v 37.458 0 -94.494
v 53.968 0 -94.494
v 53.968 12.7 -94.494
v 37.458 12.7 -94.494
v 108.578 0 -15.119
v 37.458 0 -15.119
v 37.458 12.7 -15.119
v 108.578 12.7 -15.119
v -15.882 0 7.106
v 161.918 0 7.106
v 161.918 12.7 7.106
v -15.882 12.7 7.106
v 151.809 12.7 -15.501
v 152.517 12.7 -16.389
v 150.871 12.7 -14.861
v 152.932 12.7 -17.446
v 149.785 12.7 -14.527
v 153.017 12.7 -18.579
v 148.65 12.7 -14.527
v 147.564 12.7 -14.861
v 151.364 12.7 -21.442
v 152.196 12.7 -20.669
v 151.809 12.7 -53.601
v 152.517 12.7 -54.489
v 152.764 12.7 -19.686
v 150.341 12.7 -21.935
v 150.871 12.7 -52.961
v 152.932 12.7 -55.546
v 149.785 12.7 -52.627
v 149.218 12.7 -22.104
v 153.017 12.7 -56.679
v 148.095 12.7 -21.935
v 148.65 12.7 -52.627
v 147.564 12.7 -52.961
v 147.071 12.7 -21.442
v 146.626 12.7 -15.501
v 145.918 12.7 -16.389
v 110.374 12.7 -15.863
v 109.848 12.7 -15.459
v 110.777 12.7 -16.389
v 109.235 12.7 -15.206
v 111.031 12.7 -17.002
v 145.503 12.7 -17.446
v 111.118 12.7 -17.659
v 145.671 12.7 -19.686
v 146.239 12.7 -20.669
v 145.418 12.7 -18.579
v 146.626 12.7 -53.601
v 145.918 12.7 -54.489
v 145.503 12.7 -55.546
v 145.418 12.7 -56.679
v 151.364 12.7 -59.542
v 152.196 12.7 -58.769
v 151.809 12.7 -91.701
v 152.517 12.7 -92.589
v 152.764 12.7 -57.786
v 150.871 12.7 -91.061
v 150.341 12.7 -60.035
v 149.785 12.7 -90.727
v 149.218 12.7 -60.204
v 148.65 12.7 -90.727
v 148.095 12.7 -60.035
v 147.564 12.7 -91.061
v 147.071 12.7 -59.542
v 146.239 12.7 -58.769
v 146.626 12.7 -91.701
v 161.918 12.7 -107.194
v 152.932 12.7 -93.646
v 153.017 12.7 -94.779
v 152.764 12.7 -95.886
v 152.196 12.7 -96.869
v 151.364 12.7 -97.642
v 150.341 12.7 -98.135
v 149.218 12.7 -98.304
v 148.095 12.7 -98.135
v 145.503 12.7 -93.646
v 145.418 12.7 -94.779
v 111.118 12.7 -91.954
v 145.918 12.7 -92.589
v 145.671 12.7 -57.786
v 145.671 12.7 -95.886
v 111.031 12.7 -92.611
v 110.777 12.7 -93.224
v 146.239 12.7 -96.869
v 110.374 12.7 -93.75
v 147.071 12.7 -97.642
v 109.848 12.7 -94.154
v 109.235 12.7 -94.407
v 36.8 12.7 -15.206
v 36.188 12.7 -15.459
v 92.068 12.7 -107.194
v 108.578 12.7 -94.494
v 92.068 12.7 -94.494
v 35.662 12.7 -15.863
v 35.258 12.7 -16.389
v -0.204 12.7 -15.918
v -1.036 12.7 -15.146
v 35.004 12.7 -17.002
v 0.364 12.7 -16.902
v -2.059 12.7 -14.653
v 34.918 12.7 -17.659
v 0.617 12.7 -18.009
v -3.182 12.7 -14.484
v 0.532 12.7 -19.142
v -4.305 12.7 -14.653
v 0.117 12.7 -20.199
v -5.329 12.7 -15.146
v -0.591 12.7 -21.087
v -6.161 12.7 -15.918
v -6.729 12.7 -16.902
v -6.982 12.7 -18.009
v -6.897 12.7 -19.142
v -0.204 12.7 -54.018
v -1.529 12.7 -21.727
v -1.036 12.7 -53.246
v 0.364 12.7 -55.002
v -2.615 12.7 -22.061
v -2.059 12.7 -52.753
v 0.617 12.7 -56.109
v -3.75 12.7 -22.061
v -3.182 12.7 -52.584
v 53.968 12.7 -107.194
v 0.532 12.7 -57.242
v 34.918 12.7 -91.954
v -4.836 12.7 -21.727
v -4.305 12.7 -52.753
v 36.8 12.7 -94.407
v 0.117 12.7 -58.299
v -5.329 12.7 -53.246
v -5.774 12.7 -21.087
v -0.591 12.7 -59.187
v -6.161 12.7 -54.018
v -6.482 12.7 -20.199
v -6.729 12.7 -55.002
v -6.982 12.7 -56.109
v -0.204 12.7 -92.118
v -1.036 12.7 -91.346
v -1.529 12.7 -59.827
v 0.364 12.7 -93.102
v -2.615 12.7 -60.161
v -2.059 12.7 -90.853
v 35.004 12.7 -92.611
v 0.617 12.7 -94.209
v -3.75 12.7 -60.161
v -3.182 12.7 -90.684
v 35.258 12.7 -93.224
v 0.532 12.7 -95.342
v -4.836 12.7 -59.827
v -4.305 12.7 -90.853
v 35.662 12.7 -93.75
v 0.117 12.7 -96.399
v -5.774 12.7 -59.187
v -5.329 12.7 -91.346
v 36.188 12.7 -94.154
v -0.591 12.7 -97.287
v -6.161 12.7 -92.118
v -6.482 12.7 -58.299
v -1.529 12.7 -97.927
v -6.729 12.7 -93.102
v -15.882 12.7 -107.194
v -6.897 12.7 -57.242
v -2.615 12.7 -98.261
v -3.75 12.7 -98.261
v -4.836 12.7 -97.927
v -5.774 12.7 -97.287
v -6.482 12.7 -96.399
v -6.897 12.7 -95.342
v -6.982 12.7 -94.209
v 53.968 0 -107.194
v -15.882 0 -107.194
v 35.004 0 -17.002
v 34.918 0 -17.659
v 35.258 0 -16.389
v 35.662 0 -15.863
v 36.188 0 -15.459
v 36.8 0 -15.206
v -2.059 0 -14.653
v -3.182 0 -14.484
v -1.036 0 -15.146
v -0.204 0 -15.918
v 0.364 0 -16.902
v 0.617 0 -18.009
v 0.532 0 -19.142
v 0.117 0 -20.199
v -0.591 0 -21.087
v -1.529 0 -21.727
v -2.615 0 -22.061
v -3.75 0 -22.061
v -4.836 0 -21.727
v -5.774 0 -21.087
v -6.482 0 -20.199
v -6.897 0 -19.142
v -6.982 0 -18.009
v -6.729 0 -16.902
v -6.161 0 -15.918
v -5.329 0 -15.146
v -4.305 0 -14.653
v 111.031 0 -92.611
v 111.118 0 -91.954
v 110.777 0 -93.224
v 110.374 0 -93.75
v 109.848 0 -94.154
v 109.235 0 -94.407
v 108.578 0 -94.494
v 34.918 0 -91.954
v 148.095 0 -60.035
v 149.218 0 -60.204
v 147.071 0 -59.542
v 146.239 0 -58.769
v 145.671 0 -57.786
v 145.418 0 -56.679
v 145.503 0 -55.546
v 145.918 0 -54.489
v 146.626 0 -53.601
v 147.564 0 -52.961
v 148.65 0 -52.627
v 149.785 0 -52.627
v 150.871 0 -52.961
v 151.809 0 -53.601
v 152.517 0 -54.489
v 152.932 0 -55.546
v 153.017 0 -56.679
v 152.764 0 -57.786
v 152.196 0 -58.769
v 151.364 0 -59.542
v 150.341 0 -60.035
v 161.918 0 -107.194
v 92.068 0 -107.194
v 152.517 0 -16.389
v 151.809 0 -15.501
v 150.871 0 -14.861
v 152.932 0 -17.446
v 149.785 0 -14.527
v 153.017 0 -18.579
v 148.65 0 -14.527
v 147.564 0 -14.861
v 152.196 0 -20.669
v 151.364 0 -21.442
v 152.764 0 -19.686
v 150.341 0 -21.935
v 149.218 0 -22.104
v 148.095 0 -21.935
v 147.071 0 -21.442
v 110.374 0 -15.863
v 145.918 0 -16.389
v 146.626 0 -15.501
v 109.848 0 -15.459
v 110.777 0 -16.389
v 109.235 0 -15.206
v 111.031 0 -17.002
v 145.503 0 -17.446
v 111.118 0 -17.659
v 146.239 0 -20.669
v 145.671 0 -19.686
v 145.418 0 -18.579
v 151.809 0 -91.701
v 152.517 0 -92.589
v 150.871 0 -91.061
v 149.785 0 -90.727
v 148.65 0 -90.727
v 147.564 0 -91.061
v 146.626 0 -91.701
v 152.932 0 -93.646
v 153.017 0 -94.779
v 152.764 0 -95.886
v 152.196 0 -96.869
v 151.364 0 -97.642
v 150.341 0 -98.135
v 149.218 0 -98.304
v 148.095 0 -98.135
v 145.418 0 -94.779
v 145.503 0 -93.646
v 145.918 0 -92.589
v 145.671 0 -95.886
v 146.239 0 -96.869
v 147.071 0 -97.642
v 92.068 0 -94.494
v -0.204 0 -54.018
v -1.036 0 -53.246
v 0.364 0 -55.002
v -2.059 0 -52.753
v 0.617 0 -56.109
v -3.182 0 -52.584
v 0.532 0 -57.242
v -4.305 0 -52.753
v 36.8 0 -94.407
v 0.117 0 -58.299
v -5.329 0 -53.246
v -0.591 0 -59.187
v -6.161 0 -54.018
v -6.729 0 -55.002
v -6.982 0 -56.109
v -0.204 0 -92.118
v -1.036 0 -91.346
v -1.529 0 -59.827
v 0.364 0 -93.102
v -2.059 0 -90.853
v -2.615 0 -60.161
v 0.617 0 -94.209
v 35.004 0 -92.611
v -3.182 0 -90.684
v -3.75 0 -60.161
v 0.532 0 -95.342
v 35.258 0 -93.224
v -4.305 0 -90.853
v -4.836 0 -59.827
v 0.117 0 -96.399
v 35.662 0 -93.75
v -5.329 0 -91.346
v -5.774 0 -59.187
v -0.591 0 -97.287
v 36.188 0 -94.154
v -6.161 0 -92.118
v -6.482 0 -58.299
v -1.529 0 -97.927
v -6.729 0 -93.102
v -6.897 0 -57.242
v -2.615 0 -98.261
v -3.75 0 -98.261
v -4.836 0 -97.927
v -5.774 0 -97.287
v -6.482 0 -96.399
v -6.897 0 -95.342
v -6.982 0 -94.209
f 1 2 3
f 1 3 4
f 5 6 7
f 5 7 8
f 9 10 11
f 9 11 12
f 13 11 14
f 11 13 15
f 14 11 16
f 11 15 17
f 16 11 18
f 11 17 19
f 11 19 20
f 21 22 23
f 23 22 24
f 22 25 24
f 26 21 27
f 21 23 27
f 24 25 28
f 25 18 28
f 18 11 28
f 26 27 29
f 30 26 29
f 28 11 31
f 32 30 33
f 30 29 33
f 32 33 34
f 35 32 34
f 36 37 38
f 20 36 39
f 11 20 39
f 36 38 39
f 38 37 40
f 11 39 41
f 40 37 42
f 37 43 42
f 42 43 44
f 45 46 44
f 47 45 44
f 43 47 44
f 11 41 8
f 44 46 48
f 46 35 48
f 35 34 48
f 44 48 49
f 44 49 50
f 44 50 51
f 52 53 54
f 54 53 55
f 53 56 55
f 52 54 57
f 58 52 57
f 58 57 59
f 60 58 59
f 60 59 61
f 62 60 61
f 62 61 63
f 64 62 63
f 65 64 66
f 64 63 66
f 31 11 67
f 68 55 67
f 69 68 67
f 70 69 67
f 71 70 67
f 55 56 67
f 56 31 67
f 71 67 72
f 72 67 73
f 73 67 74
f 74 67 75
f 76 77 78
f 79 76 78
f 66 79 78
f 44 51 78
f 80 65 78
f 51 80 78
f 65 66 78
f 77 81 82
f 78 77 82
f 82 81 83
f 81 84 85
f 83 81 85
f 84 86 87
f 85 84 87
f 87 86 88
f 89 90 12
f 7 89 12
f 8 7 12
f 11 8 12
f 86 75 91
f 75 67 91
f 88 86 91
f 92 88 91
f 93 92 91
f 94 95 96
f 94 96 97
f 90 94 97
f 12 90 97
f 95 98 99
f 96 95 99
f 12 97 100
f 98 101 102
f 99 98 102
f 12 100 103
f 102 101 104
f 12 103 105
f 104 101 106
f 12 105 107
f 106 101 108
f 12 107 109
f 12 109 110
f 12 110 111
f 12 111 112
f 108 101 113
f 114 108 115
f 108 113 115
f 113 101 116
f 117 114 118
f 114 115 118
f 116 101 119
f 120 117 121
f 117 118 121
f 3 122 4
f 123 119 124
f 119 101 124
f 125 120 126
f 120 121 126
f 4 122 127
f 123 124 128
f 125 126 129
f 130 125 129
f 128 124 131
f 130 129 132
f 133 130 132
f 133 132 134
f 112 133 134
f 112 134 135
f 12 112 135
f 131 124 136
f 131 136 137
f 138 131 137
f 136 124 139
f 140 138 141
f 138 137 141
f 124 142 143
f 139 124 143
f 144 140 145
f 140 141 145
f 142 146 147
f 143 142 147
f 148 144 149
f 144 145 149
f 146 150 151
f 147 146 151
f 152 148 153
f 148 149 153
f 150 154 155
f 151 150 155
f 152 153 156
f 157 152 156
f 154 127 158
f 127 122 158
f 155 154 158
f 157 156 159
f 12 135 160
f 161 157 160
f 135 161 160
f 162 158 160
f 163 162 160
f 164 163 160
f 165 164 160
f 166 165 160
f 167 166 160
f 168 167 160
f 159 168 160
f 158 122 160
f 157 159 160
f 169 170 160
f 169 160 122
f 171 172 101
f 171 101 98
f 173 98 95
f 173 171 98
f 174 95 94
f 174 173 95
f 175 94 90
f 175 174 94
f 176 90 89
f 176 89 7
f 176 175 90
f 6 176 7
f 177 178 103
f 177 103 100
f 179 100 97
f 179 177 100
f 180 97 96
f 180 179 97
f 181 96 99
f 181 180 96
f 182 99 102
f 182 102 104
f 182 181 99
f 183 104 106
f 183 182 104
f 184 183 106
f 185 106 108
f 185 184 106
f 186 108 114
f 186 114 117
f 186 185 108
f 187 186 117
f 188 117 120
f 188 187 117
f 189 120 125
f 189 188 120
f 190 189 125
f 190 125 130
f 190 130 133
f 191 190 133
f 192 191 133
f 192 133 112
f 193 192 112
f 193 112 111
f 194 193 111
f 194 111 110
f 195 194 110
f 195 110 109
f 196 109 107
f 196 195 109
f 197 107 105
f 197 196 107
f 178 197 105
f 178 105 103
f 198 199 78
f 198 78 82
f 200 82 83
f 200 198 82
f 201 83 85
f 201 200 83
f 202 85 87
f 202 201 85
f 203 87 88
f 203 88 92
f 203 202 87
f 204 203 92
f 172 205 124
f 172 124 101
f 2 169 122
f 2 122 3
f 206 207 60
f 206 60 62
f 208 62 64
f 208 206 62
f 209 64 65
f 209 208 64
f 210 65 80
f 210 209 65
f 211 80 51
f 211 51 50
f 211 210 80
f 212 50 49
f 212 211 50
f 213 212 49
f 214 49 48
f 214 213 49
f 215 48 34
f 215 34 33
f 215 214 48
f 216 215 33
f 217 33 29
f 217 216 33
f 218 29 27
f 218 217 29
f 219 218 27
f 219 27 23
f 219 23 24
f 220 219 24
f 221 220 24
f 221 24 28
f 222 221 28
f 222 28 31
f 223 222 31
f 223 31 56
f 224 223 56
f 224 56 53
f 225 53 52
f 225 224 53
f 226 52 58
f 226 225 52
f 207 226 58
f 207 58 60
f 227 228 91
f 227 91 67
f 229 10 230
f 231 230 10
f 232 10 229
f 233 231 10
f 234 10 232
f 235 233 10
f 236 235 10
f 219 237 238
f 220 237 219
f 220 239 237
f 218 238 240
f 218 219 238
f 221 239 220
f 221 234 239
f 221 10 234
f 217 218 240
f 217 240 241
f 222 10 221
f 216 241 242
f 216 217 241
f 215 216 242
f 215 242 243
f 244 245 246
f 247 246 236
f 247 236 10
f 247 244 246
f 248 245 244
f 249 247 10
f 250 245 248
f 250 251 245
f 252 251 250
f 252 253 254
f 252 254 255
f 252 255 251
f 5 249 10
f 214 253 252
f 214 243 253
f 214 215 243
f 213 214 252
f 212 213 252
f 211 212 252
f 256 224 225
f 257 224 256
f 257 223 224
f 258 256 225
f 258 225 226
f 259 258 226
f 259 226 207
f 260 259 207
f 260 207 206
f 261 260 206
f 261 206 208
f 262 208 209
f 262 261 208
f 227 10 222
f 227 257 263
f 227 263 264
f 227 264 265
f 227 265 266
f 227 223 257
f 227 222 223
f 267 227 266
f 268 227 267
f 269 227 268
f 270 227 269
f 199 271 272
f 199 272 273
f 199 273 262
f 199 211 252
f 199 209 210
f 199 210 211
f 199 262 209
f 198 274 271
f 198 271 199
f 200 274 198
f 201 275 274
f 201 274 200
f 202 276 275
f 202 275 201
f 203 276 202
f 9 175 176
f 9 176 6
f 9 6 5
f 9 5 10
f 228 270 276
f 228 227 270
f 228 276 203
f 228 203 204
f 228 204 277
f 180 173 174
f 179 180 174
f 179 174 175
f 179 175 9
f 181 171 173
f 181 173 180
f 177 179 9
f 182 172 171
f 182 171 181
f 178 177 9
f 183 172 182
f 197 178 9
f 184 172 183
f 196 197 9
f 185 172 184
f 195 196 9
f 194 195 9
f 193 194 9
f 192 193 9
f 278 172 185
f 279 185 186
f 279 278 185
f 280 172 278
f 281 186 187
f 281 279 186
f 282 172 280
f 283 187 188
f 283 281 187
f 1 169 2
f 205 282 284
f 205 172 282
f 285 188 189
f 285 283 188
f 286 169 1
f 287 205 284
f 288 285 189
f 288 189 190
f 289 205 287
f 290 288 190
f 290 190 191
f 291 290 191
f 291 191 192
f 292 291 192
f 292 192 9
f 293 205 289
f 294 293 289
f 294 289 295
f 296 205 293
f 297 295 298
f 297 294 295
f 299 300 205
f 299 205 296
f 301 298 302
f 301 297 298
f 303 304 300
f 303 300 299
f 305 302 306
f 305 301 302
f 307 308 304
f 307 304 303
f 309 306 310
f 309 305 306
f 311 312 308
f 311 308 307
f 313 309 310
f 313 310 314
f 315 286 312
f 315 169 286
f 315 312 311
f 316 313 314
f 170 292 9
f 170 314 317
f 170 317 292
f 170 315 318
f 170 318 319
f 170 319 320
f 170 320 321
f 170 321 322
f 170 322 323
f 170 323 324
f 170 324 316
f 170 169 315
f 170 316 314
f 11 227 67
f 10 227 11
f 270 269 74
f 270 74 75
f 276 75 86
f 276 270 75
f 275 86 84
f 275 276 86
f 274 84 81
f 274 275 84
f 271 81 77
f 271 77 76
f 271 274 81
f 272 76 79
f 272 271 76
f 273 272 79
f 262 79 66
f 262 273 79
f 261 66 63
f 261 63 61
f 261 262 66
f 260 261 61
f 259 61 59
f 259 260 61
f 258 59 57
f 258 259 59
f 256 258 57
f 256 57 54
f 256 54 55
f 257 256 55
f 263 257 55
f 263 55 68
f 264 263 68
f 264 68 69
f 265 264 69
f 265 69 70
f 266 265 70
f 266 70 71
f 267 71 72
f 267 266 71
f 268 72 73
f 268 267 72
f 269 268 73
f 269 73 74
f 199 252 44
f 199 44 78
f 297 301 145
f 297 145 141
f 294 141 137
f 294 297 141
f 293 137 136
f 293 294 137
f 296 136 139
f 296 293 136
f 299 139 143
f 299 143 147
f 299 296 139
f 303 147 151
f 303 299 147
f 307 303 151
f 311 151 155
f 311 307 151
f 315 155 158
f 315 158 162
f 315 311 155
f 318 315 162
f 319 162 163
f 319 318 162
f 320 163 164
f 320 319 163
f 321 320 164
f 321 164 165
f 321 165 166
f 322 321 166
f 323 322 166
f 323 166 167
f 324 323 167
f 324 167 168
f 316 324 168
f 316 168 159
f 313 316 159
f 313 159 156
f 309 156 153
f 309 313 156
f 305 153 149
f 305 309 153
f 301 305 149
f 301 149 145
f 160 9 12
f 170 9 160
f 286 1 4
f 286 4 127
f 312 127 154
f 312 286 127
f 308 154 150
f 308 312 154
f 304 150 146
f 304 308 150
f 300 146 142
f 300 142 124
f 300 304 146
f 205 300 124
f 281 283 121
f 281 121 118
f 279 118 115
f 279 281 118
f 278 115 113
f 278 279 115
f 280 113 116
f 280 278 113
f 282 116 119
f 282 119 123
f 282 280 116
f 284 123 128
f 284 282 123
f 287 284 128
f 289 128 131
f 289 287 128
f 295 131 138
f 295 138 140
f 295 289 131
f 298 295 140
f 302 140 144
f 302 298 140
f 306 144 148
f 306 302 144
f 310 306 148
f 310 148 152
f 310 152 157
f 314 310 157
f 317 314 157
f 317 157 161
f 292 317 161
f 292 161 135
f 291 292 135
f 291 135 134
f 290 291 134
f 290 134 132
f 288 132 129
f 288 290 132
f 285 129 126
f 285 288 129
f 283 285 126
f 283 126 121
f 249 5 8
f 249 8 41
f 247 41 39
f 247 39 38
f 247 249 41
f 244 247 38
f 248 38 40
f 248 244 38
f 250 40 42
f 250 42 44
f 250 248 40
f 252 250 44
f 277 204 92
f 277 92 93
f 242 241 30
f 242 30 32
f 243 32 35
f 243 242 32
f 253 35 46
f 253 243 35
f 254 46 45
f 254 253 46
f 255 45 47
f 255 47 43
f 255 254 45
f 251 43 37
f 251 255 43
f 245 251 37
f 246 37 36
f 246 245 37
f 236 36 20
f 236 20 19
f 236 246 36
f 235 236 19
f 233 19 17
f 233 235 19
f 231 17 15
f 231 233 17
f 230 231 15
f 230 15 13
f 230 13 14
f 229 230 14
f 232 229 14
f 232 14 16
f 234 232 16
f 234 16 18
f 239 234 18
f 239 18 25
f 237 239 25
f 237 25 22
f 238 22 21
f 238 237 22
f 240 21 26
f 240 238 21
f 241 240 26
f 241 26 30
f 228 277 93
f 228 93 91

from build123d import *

# Parameters (mm, degrees)
SKETCH1_R           = 3.81
BOSS_EXTRUDE1_DEPTH = 12.7


with BuildPart() as part:
    # Sketch1 → Boss-Extrude1 (new body)
    with BuildSketch(Plane(origin=(0, 0, 0), x_dir=(1, 0, 0), z_dir=(0, 1, 0))):
        with BuildLine():
            Line((92.067570855, 107.193983746), (161.917570855, 107.193983746))
            Line((161.917570855, 107.193983746), (161.917570855, -7.106016254))
            Line((161.917570855, -7.106016254), (-15.882429145, -7.106016254))
            Line((-15.882429145, -7.106016254), (-15.882429145, 107.193983746))
            Line((-15.882429145, 107.193983746), (53.967570855, 107.193983746))
            Line((53.967570855, 107.193983746), (53.967570855, 94.493983746))
            Line((53.967570855, 94.493983746), (37.457570855, 94.493983746))
            ThreePointArc((37.457570855, 94.493983746), (35.661519631, 93.75003497), (34.917570855, 91.953983746))
            Line((34.917570855, 91.953983746), (34.917570855, 17.658983746))
            ThreePointArc((34.917570855, 17.658983746), (35.661519631, 15.862932521), (37.457570855, 15.118983746))
            Line((37.457570855, 15.118983746), (108.577570855, 15.118983746))
            ThreePointArc((108.577570855, 15.118983746), (110.373622079, 15.862932521), (111.117570855, 17.658983746))
            Line((111.117570855, 17.658983746), (111.117570855, 91.953983746))
            ThreePointArc((111.117570855, 91.953983746), (110.373622079, 93.75003497), (108.577570855, 94.493983746))
            Line((108.577570855, 94.493983746), (92.067570855, 94.493983746))
            Line((92.067570855, 94.493983746), (92.067570855, 107.193983746))
        make_face()
        with Locations(Location((-3.182429145, 94.493983746, 0), (0, 0, 270))):
            Circle(SKETCH1_R, mode=Mode.SUBTRACT)
        with Locations(Location((-3.182429145, 56.393983746, 0), (0, 0, 270))):
            Circle(SKETCH1_R, mode=Mode.SUBTRACT)
        with Locations(Location((-3.182429145, 18.293983746, 0), (0, 0, 270))):
            Circle(SKETCH1_R, mode=Mode.SUBTRACT)
        with Locations(Location((149.217570855, 94.493983746, 0), (0, 0, 90))):
            Circle(SKETCH1_R, mode=Mode.SUBTRACT)
        with Locations(Location((149.217570855, 56.393983746, 0), (0, 0, 90))):
            Circle(SKETCH1_R, mode=Mode.SUBTRACT)
        with Locations(Location((149.217570855, 18.293983746, 0), (0, 0, 90))):
            Circle(SKETCH1_R, mode=Mode.SUBTRACT)
    extrude(amount=BOSS_EXTRUDE1_DEPTH)


solid = part.part
